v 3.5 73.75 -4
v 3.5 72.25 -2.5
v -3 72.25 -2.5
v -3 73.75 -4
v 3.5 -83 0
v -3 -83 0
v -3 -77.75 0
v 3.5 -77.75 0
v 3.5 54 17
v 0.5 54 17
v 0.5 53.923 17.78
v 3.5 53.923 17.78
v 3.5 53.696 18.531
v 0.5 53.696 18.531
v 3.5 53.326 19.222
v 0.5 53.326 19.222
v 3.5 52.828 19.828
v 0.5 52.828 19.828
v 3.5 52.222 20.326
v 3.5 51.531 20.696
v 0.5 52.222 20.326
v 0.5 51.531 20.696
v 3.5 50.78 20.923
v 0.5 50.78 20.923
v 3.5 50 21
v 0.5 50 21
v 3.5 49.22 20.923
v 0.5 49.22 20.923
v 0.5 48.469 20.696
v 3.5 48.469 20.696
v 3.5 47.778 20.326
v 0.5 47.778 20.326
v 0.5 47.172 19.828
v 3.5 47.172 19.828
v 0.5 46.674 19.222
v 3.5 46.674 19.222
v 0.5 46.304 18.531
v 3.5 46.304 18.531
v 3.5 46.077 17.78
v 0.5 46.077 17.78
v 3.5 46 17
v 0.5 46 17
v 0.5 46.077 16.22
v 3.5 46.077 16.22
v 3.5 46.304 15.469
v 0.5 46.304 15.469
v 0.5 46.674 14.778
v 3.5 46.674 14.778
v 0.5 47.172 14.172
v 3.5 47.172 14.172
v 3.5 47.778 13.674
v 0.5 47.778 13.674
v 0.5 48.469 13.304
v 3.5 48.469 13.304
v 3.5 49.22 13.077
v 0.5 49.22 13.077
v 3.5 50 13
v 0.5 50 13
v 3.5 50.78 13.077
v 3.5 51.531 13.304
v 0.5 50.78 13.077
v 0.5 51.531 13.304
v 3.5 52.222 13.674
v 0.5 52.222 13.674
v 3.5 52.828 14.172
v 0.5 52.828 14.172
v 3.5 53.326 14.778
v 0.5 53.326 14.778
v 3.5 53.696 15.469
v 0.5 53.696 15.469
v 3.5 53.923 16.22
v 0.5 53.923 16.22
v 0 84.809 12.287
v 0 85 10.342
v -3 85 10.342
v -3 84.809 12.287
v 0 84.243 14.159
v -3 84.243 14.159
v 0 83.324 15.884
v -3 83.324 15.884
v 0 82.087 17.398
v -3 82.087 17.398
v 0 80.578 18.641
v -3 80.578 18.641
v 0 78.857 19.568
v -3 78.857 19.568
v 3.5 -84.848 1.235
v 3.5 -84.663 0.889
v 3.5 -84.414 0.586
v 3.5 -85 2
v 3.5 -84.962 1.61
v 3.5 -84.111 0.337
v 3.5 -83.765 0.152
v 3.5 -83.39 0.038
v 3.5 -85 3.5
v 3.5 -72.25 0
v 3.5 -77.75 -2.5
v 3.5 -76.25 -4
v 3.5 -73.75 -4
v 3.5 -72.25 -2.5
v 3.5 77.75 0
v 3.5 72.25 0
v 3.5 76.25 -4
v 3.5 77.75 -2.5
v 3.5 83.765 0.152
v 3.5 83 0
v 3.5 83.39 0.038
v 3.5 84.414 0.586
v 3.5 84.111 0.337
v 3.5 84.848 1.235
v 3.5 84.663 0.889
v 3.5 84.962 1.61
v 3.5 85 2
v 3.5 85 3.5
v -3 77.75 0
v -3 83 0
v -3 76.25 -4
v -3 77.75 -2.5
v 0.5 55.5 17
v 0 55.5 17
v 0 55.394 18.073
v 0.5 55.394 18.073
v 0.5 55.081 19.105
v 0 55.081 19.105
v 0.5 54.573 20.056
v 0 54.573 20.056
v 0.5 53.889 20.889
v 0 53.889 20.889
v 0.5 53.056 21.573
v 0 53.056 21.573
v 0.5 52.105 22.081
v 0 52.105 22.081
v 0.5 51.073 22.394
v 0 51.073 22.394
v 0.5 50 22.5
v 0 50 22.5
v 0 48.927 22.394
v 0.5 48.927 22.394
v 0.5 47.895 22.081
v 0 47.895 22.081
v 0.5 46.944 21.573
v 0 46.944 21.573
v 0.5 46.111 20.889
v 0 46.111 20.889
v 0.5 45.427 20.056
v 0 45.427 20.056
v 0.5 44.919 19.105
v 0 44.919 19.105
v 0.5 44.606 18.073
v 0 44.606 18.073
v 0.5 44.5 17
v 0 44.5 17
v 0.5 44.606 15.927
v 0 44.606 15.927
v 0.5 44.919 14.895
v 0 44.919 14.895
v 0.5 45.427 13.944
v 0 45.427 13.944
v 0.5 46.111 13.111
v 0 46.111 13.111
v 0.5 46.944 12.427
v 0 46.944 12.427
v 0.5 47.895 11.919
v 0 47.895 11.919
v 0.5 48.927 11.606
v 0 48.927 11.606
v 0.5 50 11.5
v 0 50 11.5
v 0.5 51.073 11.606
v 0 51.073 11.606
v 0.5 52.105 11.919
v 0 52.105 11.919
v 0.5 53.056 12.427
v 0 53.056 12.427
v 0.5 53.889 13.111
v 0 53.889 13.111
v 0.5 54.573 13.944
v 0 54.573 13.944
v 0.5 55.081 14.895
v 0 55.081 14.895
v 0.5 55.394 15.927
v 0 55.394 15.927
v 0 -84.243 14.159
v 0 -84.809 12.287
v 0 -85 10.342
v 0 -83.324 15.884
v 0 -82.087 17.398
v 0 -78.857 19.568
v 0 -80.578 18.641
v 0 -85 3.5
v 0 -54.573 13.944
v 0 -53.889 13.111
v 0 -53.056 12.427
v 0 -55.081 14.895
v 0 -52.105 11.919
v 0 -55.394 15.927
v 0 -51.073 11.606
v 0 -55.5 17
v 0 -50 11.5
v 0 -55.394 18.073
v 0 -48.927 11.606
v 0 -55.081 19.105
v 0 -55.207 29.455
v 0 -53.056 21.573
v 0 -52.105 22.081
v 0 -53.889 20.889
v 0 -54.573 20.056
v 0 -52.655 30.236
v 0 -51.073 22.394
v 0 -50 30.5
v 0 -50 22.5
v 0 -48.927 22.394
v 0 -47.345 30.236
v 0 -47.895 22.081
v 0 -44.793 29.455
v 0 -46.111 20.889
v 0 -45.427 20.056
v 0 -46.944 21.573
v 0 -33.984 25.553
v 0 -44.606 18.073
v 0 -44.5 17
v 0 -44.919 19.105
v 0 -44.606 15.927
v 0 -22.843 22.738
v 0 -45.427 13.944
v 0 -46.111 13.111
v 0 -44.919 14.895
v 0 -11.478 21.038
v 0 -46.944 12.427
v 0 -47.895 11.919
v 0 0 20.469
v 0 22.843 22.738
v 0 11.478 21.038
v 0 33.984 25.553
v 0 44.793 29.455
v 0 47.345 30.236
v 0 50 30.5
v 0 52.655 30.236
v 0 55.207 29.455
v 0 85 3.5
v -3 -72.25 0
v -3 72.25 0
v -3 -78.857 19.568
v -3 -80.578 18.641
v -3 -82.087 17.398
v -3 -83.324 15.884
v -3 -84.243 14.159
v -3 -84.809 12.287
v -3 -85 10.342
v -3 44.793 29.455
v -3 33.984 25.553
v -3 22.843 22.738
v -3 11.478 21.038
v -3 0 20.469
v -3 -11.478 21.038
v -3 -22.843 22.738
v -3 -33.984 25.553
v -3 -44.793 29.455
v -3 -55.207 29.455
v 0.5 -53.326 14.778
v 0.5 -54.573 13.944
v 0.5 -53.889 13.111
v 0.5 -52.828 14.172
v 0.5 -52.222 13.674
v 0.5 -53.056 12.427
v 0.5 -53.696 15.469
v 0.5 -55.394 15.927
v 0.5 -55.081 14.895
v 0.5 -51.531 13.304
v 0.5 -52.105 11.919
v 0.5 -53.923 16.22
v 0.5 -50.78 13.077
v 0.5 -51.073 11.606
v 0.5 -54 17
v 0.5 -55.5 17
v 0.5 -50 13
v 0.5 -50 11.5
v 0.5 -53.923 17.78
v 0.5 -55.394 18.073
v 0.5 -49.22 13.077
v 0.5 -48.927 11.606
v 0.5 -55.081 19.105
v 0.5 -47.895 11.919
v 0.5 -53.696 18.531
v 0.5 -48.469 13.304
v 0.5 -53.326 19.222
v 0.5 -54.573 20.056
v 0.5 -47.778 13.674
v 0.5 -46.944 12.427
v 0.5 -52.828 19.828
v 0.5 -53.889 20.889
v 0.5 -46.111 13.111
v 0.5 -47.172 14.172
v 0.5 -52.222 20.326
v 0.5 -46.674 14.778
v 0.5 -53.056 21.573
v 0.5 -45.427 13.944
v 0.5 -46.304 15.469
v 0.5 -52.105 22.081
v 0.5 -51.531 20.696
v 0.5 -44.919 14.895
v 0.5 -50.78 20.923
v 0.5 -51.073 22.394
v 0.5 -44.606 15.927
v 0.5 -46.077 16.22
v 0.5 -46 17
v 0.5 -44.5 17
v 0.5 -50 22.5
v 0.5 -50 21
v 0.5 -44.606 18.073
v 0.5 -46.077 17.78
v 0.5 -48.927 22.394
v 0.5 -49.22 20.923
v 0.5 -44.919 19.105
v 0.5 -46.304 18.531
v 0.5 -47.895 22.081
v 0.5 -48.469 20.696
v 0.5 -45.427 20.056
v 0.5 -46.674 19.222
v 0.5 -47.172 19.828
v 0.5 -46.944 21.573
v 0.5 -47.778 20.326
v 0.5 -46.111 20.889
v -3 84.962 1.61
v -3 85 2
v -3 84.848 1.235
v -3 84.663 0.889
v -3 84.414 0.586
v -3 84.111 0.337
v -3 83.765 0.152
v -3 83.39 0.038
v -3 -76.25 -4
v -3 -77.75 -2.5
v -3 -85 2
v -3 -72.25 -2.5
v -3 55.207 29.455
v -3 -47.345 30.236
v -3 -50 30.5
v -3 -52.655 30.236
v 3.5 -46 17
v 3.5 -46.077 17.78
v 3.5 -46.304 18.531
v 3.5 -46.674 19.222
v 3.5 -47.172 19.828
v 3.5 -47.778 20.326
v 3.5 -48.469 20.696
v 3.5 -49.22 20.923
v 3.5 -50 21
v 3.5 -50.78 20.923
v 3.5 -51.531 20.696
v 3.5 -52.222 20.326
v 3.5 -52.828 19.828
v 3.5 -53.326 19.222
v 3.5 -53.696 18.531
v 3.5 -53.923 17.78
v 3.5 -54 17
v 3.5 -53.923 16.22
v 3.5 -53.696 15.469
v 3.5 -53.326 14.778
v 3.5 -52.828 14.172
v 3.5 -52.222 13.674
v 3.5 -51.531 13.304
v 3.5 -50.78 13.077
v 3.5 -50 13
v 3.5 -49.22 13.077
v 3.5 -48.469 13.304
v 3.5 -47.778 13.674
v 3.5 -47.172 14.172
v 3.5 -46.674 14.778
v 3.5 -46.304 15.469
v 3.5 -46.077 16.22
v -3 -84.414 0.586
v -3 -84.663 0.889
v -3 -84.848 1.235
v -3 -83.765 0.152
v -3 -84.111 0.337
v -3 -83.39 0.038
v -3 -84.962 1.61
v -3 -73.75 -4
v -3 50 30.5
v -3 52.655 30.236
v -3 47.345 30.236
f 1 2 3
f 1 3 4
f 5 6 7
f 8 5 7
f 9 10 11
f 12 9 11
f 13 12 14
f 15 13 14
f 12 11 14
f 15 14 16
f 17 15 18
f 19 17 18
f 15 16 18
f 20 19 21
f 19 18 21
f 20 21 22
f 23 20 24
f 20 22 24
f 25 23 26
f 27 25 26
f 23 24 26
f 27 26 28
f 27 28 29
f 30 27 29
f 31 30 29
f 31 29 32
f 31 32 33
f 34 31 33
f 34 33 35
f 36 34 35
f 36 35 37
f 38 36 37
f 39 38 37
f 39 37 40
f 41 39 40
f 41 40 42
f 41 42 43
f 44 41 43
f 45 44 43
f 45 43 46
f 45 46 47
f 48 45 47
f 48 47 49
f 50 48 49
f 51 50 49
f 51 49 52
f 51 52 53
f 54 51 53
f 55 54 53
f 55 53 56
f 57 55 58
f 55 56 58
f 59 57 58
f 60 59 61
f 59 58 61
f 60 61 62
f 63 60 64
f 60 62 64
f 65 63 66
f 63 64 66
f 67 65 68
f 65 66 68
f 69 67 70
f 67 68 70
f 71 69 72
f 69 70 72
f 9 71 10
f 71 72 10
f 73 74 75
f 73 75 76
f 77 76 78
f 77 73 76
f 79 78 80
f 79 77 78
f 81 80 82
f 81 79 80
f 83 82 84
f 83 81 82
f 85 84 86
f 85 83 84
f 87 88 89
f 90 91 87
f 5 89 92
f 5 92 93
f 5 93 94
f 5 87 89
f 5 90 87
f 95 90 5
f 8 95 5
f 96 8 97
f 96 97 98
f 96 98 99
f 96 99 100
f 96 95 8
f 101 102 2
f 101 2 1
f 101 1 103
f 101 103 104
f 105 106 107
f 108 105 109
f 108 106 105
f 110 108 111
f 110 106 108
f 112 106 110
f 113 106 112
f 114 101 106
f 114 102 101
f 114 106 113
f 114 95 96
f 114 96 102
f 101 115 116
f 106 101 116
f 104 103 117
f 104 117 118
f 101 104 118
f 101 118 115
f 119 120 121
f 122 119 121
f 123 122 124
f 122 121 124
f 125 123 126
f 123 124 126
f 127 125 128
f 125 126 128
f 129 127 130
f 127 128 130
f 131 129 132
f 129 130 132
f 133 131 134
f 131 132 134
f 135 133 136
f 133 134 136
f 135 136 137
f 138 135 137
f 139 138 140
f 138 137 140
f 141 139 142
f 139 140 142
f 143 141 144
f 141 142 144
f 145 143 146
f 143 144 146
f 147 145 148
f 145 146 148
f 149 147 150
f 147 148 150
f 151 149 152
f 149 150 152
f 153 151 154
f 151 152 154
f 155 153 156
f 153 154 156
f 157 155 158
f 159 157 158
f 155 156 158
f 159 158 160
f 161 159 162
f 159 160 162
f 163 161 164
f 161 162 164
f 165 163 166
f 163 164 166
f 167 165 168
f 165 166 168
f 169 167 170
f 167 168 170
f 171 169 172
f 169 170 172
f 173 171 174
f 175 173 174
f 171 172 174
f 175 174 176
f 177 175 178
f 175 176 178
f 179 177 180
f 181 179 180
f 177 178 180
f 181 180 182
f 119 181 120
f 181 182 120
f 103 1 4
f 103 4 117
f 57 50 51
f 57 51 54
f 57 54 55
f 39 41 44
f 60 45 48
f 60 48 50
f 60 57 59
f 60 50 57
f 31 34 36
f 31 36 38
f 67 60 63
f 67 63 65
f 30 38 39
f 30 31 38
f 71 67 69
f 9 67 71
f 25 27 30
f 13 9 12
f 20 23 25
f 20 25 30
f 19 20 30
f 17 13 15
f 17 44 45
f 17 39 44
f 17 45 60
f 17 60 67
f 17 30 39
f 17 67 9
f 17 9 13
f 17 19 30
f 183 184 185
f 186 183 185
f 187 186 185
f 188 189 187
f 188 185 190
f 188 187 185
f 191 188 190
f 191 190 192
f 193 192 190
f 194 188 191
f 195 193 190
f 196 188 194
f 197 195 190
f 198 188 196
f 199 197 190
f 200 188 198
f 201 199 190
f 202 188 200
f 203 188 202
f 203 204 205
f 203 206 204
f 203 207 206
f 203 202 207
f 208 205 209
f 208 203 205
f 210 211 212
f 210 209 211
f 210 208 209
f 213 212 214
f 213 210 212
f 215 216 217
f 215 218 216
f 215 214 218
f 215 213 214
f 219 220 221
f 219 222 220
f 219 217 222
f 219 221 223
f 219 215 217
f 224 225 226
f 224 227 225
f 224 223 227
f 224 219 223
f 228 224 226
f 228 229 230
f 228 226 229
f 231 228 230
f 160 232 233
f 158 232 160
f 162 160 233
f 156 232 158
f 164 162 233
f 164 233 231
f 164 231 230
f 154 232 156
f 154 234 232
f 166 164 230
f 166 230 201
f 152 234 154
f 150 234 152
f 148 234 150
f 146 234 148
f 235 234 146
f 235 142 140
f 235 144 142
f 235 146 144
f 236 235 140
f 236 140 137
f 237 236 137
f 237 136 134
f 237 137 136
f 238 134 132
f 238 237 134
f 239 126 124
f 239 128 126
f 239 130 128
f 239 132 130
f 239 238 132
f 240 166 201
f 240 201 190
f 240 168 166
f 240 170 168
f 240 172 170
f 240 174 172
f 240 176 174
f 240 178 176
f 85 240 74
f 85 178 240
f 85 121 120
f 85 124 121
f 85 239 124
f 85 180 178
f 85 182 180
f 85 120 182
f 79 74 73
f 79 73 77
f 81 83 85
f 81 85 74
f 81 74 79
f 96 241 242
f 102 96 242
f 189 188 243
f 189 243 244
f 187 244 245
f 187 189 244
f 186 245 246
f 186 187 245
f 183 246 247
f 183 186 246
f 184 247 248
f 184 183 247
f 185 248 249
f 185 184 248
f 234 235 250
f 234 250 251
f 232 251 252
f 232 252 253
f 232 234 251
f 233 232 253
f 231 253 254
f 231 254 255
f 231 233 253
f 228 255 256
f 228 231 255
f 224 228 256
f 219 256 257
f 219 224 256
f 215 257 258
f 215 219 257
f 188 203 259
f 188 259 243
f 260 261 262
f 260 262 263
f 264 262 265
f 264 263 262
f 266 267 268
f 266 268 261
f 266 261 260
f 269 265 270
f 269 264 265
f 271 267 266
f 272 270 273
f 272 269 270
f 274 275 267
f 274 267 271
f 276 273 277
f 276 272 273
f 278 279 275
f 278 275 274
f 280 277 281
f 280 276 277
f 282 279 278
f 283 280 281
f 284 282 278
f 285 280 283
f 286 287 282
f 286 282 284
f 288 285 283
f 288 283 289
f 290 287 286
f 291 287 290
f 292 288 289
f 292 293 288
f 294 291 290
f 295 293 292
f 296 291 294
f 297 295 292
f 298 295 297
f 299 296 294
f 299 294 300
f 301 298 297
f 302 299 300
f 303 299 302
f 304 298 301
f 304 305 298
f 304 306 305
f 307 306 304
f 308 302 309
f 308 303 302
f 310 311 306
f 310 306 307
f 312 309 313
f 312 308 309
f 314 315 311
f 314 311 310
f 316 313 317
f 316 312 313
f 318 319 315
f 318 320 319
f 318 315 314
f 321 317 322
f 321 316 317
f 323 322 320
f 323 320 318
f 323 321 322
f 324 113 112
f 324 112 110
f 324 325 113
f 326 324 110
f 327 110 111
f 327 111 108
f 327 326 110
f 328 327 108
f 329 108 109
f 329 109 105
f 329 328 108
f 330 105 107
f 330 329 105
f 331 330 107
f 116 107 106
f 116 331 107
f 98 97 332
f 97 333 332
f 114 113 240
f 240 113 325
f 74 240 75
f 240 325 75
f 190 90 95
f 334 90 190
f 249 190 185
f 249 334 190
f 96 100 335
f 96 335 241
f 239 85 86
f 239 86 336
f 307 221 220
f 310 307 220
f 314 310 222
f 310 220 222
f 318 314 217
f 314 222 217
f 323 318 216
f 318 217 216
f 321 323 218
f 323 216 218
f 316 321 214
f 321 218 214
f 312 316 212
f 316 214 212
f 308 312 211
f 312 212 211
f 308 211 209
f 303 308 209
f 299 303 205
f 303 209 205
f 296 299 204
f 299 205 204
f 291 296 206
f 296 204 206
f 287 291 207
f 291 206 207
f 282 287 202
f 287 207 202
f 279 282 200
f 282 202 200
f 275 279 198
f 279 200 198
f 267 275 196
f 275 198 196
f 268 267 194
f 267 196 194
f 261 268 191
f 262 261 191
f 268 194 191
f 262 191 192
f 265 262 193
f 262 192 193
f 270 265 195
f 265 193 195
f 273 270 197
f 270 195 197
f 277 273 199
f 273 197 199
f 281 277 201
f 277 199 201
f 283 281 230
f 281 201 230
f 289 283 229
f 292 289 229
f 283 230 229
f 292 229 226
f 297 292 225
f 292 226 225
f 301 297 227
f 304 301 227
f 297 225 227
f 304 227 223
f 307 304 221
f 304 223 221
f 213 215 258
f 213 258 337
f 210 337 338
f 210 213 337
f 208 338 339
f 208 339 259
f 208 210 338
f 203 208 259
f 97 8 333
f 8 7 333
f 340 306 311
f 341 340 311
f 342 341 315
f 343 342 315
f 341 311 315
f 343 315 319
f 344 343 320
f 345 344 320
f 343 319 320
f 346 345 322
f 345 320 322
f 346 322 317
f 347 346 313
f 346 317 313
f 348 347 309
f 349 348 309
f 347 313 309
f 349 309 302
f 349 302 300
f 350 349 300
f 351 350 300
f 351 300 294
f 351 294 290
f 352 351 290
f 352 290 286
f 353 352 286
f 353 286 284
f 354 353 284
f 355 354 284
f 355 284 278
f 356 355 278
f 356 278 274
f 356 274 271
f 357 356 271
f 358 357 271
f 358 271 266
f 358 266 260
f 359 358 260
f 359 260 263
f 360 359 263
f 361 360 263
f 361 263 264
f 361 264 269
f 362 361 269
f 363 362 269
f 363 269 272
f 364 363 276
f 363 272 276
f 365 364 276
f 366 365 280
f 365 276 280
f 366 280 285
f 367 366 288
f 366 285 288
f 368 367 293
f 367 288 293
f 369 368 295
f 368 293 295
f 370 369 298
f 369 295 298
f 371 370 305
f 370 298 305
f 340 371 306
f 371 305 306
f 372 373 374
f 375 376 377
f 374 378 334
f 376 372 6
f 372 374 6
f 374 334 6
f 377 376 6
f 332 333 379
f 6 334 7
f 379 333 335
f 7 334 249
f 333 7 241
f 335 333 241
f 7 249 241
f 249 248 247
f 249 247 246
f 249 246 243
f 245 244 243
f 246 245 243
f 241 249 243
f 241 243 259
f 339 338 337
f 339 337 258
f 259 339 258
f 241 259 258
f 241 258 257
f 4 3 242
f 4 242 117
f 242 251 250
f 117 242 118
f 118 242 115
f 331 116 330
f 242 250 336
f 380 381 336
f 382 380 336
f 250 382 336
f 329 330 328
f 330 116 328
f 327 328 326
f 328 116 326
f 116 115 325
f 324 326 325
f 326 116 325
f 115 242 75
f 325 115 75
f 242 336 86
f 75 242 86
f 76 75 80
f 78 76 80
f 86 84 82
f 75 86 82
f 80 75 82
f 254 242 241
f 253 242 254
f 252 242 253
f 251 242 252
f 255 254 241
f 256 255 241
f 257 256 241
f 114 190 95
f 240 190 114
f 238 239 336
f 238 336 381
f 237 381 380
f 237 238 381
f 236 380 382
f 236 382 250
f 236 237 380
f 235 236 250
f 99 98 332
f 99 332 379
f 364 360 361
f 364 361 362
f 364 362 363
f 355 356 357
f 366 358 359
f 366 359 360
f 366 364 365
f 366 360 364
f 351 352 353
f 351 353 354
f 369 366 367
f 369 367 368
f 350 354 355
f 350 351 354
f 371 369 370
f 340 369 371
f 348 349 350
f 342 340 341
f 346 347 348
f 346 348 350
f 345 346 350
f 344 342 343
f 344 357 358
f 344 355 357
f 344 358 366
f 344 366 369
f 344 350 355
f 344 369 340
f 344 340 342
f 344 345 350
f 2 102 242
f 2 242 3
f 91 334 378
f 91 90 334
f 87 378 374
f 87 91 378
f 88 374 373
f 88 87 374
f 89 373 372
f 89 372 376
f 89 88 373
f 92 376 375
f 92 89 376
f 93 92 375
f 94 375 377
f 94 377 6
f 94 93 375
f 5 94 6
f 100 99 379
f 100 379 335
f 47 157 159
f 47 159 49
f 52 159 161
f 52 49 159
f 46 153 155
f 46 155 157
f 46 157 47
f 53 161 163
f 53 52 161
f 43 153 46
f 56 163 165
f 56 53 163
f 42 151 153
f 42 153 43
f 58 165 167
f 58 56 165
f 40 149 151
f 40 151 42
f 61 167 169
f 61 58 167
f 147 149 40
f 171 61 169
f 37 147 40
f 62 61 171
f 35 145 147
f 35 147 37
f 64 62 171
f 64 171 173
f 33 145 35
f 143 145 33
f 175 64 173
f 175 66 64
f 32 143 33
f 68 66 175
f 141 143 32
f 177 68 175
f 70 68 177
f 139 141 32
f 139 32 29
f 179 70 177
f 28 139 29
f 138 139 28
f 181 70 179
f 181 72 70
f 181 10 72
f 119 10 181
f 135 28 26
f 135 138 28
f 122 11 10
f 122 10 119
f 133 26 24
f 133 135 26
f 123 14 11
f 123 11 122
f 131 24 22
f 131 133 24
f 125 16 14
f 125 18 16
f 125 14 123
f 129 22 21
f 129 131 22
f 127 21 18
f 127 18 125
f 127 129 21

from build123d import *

# Parameters (mm, degrees)
F1_DEPTH = 3
F2_W     = 170
F2_H     = 3.5
F2_R     = 4
F3_DEPTH = 3.5
F4_R     = 5.5
F4_R_2   = 4
F5_DEPTH = 0.5
F6_R     = 2


with BuildPart() as f1:
    # F0 (on Right) → F1 (new body)
    with BuildSketch(Plane.YZ):
        with BuildLine():
            ThreePointArc((-78.857143, 19.568113), (-83.323804, 15.883977), (-85, 10.34193))
            Line((-85, 10.34193), (-85, 0))
            Line((-85, 0), (-77.75, 0))
            Line((-77.75, 0), (-72.25, 0))
            Line((-72.25, 0), (72.25, 0))
            Line((72.25, 0), (77.75, 0))
            Line((77.75, 0), (85, 0))
            Line((85, 0), (85, 10.34193))
            ThreePointArc((85, 10.34193), (83.323804, 15.883977), (78.857143, 19.568113))
            Line((78.857143, 19.568113), (55.207143, 29.455347))
            ThreePointArc((55.207143, 29.455347), (50, 30.5), (44.792857, 29.455347))
            ThreePointArc((44.792857, 29.455347), (0, 20.469036), (-44.792857, 29.455347))
            ThreePointArc((-44.792857, 29.455347), (-50, 30.5), (-55.207143, 29.455347))
            Line((-55.207143, 29.455347), (-78.857143, 19.568113))
        make_face()
        Polygon((-72.25, 0), (-77.75, 0), (-77.75, -2.5), (-76.25, -4), (-73.75, -4), (-72.25, -2.5), align=None)
        Polygon((77.75, 0), (72.25, 0), (72.25, -2.5), (73.75, -4), (76.25, -4), (77.75, -2.5), align=None)
    extrude(amount=-F1_DEPTH)

    # F2 (on face) + F0 (on Right) → F3 (join)
    with BuildSketch(Plane.YZ):
        with Locations((0, 1.75)):
            Rectangle(F2_W, F2_H)
        with Locations((-50, 17)):
            Circle(F2_R)
        with Locations((50, 17)):
            Circle(F2_R)
    with BuildSketch(Plane.YZ):
        Polygon((-72.25, 0), (-77.75, 0), (-77.75, -2.5), (-76.25, -4), (-73.75, -4), (-72.25, -2.5), align=None)
        Polygon((77.75, 0), (72.25, 0), (72.25, -2.5), (73.75, -4), (76.25, -4), (77.75, -2.5), align=None)
    extrude(amount=F3_DEPTH)

    # F4 (on Right) → F5 (join)
    with BuildSketch(Plane.YZ):
        with Locations((-50, 17)):
            Circle(F4_R)
        with Locations((-50, 17)):
            Circle(F4_R_2, mode=Mode.SUBTRACT)
        with Locations((50, 17)):
            Circle(F4_R)
        with Locations((50, 17)):
            Circle(F4_R_2, mode=Mode.SUBTRACT)
    extrude(amount=F5_DEPTH)

    # F6
    f6_edges = [f1.edges().sort_by_distance(p)[0] for p in [
        (0.25, -85, 0),
        (0.25, 85, 0),
    ]]
    fillet(f6_edges, radius=F6_R)


solid = f1.part
